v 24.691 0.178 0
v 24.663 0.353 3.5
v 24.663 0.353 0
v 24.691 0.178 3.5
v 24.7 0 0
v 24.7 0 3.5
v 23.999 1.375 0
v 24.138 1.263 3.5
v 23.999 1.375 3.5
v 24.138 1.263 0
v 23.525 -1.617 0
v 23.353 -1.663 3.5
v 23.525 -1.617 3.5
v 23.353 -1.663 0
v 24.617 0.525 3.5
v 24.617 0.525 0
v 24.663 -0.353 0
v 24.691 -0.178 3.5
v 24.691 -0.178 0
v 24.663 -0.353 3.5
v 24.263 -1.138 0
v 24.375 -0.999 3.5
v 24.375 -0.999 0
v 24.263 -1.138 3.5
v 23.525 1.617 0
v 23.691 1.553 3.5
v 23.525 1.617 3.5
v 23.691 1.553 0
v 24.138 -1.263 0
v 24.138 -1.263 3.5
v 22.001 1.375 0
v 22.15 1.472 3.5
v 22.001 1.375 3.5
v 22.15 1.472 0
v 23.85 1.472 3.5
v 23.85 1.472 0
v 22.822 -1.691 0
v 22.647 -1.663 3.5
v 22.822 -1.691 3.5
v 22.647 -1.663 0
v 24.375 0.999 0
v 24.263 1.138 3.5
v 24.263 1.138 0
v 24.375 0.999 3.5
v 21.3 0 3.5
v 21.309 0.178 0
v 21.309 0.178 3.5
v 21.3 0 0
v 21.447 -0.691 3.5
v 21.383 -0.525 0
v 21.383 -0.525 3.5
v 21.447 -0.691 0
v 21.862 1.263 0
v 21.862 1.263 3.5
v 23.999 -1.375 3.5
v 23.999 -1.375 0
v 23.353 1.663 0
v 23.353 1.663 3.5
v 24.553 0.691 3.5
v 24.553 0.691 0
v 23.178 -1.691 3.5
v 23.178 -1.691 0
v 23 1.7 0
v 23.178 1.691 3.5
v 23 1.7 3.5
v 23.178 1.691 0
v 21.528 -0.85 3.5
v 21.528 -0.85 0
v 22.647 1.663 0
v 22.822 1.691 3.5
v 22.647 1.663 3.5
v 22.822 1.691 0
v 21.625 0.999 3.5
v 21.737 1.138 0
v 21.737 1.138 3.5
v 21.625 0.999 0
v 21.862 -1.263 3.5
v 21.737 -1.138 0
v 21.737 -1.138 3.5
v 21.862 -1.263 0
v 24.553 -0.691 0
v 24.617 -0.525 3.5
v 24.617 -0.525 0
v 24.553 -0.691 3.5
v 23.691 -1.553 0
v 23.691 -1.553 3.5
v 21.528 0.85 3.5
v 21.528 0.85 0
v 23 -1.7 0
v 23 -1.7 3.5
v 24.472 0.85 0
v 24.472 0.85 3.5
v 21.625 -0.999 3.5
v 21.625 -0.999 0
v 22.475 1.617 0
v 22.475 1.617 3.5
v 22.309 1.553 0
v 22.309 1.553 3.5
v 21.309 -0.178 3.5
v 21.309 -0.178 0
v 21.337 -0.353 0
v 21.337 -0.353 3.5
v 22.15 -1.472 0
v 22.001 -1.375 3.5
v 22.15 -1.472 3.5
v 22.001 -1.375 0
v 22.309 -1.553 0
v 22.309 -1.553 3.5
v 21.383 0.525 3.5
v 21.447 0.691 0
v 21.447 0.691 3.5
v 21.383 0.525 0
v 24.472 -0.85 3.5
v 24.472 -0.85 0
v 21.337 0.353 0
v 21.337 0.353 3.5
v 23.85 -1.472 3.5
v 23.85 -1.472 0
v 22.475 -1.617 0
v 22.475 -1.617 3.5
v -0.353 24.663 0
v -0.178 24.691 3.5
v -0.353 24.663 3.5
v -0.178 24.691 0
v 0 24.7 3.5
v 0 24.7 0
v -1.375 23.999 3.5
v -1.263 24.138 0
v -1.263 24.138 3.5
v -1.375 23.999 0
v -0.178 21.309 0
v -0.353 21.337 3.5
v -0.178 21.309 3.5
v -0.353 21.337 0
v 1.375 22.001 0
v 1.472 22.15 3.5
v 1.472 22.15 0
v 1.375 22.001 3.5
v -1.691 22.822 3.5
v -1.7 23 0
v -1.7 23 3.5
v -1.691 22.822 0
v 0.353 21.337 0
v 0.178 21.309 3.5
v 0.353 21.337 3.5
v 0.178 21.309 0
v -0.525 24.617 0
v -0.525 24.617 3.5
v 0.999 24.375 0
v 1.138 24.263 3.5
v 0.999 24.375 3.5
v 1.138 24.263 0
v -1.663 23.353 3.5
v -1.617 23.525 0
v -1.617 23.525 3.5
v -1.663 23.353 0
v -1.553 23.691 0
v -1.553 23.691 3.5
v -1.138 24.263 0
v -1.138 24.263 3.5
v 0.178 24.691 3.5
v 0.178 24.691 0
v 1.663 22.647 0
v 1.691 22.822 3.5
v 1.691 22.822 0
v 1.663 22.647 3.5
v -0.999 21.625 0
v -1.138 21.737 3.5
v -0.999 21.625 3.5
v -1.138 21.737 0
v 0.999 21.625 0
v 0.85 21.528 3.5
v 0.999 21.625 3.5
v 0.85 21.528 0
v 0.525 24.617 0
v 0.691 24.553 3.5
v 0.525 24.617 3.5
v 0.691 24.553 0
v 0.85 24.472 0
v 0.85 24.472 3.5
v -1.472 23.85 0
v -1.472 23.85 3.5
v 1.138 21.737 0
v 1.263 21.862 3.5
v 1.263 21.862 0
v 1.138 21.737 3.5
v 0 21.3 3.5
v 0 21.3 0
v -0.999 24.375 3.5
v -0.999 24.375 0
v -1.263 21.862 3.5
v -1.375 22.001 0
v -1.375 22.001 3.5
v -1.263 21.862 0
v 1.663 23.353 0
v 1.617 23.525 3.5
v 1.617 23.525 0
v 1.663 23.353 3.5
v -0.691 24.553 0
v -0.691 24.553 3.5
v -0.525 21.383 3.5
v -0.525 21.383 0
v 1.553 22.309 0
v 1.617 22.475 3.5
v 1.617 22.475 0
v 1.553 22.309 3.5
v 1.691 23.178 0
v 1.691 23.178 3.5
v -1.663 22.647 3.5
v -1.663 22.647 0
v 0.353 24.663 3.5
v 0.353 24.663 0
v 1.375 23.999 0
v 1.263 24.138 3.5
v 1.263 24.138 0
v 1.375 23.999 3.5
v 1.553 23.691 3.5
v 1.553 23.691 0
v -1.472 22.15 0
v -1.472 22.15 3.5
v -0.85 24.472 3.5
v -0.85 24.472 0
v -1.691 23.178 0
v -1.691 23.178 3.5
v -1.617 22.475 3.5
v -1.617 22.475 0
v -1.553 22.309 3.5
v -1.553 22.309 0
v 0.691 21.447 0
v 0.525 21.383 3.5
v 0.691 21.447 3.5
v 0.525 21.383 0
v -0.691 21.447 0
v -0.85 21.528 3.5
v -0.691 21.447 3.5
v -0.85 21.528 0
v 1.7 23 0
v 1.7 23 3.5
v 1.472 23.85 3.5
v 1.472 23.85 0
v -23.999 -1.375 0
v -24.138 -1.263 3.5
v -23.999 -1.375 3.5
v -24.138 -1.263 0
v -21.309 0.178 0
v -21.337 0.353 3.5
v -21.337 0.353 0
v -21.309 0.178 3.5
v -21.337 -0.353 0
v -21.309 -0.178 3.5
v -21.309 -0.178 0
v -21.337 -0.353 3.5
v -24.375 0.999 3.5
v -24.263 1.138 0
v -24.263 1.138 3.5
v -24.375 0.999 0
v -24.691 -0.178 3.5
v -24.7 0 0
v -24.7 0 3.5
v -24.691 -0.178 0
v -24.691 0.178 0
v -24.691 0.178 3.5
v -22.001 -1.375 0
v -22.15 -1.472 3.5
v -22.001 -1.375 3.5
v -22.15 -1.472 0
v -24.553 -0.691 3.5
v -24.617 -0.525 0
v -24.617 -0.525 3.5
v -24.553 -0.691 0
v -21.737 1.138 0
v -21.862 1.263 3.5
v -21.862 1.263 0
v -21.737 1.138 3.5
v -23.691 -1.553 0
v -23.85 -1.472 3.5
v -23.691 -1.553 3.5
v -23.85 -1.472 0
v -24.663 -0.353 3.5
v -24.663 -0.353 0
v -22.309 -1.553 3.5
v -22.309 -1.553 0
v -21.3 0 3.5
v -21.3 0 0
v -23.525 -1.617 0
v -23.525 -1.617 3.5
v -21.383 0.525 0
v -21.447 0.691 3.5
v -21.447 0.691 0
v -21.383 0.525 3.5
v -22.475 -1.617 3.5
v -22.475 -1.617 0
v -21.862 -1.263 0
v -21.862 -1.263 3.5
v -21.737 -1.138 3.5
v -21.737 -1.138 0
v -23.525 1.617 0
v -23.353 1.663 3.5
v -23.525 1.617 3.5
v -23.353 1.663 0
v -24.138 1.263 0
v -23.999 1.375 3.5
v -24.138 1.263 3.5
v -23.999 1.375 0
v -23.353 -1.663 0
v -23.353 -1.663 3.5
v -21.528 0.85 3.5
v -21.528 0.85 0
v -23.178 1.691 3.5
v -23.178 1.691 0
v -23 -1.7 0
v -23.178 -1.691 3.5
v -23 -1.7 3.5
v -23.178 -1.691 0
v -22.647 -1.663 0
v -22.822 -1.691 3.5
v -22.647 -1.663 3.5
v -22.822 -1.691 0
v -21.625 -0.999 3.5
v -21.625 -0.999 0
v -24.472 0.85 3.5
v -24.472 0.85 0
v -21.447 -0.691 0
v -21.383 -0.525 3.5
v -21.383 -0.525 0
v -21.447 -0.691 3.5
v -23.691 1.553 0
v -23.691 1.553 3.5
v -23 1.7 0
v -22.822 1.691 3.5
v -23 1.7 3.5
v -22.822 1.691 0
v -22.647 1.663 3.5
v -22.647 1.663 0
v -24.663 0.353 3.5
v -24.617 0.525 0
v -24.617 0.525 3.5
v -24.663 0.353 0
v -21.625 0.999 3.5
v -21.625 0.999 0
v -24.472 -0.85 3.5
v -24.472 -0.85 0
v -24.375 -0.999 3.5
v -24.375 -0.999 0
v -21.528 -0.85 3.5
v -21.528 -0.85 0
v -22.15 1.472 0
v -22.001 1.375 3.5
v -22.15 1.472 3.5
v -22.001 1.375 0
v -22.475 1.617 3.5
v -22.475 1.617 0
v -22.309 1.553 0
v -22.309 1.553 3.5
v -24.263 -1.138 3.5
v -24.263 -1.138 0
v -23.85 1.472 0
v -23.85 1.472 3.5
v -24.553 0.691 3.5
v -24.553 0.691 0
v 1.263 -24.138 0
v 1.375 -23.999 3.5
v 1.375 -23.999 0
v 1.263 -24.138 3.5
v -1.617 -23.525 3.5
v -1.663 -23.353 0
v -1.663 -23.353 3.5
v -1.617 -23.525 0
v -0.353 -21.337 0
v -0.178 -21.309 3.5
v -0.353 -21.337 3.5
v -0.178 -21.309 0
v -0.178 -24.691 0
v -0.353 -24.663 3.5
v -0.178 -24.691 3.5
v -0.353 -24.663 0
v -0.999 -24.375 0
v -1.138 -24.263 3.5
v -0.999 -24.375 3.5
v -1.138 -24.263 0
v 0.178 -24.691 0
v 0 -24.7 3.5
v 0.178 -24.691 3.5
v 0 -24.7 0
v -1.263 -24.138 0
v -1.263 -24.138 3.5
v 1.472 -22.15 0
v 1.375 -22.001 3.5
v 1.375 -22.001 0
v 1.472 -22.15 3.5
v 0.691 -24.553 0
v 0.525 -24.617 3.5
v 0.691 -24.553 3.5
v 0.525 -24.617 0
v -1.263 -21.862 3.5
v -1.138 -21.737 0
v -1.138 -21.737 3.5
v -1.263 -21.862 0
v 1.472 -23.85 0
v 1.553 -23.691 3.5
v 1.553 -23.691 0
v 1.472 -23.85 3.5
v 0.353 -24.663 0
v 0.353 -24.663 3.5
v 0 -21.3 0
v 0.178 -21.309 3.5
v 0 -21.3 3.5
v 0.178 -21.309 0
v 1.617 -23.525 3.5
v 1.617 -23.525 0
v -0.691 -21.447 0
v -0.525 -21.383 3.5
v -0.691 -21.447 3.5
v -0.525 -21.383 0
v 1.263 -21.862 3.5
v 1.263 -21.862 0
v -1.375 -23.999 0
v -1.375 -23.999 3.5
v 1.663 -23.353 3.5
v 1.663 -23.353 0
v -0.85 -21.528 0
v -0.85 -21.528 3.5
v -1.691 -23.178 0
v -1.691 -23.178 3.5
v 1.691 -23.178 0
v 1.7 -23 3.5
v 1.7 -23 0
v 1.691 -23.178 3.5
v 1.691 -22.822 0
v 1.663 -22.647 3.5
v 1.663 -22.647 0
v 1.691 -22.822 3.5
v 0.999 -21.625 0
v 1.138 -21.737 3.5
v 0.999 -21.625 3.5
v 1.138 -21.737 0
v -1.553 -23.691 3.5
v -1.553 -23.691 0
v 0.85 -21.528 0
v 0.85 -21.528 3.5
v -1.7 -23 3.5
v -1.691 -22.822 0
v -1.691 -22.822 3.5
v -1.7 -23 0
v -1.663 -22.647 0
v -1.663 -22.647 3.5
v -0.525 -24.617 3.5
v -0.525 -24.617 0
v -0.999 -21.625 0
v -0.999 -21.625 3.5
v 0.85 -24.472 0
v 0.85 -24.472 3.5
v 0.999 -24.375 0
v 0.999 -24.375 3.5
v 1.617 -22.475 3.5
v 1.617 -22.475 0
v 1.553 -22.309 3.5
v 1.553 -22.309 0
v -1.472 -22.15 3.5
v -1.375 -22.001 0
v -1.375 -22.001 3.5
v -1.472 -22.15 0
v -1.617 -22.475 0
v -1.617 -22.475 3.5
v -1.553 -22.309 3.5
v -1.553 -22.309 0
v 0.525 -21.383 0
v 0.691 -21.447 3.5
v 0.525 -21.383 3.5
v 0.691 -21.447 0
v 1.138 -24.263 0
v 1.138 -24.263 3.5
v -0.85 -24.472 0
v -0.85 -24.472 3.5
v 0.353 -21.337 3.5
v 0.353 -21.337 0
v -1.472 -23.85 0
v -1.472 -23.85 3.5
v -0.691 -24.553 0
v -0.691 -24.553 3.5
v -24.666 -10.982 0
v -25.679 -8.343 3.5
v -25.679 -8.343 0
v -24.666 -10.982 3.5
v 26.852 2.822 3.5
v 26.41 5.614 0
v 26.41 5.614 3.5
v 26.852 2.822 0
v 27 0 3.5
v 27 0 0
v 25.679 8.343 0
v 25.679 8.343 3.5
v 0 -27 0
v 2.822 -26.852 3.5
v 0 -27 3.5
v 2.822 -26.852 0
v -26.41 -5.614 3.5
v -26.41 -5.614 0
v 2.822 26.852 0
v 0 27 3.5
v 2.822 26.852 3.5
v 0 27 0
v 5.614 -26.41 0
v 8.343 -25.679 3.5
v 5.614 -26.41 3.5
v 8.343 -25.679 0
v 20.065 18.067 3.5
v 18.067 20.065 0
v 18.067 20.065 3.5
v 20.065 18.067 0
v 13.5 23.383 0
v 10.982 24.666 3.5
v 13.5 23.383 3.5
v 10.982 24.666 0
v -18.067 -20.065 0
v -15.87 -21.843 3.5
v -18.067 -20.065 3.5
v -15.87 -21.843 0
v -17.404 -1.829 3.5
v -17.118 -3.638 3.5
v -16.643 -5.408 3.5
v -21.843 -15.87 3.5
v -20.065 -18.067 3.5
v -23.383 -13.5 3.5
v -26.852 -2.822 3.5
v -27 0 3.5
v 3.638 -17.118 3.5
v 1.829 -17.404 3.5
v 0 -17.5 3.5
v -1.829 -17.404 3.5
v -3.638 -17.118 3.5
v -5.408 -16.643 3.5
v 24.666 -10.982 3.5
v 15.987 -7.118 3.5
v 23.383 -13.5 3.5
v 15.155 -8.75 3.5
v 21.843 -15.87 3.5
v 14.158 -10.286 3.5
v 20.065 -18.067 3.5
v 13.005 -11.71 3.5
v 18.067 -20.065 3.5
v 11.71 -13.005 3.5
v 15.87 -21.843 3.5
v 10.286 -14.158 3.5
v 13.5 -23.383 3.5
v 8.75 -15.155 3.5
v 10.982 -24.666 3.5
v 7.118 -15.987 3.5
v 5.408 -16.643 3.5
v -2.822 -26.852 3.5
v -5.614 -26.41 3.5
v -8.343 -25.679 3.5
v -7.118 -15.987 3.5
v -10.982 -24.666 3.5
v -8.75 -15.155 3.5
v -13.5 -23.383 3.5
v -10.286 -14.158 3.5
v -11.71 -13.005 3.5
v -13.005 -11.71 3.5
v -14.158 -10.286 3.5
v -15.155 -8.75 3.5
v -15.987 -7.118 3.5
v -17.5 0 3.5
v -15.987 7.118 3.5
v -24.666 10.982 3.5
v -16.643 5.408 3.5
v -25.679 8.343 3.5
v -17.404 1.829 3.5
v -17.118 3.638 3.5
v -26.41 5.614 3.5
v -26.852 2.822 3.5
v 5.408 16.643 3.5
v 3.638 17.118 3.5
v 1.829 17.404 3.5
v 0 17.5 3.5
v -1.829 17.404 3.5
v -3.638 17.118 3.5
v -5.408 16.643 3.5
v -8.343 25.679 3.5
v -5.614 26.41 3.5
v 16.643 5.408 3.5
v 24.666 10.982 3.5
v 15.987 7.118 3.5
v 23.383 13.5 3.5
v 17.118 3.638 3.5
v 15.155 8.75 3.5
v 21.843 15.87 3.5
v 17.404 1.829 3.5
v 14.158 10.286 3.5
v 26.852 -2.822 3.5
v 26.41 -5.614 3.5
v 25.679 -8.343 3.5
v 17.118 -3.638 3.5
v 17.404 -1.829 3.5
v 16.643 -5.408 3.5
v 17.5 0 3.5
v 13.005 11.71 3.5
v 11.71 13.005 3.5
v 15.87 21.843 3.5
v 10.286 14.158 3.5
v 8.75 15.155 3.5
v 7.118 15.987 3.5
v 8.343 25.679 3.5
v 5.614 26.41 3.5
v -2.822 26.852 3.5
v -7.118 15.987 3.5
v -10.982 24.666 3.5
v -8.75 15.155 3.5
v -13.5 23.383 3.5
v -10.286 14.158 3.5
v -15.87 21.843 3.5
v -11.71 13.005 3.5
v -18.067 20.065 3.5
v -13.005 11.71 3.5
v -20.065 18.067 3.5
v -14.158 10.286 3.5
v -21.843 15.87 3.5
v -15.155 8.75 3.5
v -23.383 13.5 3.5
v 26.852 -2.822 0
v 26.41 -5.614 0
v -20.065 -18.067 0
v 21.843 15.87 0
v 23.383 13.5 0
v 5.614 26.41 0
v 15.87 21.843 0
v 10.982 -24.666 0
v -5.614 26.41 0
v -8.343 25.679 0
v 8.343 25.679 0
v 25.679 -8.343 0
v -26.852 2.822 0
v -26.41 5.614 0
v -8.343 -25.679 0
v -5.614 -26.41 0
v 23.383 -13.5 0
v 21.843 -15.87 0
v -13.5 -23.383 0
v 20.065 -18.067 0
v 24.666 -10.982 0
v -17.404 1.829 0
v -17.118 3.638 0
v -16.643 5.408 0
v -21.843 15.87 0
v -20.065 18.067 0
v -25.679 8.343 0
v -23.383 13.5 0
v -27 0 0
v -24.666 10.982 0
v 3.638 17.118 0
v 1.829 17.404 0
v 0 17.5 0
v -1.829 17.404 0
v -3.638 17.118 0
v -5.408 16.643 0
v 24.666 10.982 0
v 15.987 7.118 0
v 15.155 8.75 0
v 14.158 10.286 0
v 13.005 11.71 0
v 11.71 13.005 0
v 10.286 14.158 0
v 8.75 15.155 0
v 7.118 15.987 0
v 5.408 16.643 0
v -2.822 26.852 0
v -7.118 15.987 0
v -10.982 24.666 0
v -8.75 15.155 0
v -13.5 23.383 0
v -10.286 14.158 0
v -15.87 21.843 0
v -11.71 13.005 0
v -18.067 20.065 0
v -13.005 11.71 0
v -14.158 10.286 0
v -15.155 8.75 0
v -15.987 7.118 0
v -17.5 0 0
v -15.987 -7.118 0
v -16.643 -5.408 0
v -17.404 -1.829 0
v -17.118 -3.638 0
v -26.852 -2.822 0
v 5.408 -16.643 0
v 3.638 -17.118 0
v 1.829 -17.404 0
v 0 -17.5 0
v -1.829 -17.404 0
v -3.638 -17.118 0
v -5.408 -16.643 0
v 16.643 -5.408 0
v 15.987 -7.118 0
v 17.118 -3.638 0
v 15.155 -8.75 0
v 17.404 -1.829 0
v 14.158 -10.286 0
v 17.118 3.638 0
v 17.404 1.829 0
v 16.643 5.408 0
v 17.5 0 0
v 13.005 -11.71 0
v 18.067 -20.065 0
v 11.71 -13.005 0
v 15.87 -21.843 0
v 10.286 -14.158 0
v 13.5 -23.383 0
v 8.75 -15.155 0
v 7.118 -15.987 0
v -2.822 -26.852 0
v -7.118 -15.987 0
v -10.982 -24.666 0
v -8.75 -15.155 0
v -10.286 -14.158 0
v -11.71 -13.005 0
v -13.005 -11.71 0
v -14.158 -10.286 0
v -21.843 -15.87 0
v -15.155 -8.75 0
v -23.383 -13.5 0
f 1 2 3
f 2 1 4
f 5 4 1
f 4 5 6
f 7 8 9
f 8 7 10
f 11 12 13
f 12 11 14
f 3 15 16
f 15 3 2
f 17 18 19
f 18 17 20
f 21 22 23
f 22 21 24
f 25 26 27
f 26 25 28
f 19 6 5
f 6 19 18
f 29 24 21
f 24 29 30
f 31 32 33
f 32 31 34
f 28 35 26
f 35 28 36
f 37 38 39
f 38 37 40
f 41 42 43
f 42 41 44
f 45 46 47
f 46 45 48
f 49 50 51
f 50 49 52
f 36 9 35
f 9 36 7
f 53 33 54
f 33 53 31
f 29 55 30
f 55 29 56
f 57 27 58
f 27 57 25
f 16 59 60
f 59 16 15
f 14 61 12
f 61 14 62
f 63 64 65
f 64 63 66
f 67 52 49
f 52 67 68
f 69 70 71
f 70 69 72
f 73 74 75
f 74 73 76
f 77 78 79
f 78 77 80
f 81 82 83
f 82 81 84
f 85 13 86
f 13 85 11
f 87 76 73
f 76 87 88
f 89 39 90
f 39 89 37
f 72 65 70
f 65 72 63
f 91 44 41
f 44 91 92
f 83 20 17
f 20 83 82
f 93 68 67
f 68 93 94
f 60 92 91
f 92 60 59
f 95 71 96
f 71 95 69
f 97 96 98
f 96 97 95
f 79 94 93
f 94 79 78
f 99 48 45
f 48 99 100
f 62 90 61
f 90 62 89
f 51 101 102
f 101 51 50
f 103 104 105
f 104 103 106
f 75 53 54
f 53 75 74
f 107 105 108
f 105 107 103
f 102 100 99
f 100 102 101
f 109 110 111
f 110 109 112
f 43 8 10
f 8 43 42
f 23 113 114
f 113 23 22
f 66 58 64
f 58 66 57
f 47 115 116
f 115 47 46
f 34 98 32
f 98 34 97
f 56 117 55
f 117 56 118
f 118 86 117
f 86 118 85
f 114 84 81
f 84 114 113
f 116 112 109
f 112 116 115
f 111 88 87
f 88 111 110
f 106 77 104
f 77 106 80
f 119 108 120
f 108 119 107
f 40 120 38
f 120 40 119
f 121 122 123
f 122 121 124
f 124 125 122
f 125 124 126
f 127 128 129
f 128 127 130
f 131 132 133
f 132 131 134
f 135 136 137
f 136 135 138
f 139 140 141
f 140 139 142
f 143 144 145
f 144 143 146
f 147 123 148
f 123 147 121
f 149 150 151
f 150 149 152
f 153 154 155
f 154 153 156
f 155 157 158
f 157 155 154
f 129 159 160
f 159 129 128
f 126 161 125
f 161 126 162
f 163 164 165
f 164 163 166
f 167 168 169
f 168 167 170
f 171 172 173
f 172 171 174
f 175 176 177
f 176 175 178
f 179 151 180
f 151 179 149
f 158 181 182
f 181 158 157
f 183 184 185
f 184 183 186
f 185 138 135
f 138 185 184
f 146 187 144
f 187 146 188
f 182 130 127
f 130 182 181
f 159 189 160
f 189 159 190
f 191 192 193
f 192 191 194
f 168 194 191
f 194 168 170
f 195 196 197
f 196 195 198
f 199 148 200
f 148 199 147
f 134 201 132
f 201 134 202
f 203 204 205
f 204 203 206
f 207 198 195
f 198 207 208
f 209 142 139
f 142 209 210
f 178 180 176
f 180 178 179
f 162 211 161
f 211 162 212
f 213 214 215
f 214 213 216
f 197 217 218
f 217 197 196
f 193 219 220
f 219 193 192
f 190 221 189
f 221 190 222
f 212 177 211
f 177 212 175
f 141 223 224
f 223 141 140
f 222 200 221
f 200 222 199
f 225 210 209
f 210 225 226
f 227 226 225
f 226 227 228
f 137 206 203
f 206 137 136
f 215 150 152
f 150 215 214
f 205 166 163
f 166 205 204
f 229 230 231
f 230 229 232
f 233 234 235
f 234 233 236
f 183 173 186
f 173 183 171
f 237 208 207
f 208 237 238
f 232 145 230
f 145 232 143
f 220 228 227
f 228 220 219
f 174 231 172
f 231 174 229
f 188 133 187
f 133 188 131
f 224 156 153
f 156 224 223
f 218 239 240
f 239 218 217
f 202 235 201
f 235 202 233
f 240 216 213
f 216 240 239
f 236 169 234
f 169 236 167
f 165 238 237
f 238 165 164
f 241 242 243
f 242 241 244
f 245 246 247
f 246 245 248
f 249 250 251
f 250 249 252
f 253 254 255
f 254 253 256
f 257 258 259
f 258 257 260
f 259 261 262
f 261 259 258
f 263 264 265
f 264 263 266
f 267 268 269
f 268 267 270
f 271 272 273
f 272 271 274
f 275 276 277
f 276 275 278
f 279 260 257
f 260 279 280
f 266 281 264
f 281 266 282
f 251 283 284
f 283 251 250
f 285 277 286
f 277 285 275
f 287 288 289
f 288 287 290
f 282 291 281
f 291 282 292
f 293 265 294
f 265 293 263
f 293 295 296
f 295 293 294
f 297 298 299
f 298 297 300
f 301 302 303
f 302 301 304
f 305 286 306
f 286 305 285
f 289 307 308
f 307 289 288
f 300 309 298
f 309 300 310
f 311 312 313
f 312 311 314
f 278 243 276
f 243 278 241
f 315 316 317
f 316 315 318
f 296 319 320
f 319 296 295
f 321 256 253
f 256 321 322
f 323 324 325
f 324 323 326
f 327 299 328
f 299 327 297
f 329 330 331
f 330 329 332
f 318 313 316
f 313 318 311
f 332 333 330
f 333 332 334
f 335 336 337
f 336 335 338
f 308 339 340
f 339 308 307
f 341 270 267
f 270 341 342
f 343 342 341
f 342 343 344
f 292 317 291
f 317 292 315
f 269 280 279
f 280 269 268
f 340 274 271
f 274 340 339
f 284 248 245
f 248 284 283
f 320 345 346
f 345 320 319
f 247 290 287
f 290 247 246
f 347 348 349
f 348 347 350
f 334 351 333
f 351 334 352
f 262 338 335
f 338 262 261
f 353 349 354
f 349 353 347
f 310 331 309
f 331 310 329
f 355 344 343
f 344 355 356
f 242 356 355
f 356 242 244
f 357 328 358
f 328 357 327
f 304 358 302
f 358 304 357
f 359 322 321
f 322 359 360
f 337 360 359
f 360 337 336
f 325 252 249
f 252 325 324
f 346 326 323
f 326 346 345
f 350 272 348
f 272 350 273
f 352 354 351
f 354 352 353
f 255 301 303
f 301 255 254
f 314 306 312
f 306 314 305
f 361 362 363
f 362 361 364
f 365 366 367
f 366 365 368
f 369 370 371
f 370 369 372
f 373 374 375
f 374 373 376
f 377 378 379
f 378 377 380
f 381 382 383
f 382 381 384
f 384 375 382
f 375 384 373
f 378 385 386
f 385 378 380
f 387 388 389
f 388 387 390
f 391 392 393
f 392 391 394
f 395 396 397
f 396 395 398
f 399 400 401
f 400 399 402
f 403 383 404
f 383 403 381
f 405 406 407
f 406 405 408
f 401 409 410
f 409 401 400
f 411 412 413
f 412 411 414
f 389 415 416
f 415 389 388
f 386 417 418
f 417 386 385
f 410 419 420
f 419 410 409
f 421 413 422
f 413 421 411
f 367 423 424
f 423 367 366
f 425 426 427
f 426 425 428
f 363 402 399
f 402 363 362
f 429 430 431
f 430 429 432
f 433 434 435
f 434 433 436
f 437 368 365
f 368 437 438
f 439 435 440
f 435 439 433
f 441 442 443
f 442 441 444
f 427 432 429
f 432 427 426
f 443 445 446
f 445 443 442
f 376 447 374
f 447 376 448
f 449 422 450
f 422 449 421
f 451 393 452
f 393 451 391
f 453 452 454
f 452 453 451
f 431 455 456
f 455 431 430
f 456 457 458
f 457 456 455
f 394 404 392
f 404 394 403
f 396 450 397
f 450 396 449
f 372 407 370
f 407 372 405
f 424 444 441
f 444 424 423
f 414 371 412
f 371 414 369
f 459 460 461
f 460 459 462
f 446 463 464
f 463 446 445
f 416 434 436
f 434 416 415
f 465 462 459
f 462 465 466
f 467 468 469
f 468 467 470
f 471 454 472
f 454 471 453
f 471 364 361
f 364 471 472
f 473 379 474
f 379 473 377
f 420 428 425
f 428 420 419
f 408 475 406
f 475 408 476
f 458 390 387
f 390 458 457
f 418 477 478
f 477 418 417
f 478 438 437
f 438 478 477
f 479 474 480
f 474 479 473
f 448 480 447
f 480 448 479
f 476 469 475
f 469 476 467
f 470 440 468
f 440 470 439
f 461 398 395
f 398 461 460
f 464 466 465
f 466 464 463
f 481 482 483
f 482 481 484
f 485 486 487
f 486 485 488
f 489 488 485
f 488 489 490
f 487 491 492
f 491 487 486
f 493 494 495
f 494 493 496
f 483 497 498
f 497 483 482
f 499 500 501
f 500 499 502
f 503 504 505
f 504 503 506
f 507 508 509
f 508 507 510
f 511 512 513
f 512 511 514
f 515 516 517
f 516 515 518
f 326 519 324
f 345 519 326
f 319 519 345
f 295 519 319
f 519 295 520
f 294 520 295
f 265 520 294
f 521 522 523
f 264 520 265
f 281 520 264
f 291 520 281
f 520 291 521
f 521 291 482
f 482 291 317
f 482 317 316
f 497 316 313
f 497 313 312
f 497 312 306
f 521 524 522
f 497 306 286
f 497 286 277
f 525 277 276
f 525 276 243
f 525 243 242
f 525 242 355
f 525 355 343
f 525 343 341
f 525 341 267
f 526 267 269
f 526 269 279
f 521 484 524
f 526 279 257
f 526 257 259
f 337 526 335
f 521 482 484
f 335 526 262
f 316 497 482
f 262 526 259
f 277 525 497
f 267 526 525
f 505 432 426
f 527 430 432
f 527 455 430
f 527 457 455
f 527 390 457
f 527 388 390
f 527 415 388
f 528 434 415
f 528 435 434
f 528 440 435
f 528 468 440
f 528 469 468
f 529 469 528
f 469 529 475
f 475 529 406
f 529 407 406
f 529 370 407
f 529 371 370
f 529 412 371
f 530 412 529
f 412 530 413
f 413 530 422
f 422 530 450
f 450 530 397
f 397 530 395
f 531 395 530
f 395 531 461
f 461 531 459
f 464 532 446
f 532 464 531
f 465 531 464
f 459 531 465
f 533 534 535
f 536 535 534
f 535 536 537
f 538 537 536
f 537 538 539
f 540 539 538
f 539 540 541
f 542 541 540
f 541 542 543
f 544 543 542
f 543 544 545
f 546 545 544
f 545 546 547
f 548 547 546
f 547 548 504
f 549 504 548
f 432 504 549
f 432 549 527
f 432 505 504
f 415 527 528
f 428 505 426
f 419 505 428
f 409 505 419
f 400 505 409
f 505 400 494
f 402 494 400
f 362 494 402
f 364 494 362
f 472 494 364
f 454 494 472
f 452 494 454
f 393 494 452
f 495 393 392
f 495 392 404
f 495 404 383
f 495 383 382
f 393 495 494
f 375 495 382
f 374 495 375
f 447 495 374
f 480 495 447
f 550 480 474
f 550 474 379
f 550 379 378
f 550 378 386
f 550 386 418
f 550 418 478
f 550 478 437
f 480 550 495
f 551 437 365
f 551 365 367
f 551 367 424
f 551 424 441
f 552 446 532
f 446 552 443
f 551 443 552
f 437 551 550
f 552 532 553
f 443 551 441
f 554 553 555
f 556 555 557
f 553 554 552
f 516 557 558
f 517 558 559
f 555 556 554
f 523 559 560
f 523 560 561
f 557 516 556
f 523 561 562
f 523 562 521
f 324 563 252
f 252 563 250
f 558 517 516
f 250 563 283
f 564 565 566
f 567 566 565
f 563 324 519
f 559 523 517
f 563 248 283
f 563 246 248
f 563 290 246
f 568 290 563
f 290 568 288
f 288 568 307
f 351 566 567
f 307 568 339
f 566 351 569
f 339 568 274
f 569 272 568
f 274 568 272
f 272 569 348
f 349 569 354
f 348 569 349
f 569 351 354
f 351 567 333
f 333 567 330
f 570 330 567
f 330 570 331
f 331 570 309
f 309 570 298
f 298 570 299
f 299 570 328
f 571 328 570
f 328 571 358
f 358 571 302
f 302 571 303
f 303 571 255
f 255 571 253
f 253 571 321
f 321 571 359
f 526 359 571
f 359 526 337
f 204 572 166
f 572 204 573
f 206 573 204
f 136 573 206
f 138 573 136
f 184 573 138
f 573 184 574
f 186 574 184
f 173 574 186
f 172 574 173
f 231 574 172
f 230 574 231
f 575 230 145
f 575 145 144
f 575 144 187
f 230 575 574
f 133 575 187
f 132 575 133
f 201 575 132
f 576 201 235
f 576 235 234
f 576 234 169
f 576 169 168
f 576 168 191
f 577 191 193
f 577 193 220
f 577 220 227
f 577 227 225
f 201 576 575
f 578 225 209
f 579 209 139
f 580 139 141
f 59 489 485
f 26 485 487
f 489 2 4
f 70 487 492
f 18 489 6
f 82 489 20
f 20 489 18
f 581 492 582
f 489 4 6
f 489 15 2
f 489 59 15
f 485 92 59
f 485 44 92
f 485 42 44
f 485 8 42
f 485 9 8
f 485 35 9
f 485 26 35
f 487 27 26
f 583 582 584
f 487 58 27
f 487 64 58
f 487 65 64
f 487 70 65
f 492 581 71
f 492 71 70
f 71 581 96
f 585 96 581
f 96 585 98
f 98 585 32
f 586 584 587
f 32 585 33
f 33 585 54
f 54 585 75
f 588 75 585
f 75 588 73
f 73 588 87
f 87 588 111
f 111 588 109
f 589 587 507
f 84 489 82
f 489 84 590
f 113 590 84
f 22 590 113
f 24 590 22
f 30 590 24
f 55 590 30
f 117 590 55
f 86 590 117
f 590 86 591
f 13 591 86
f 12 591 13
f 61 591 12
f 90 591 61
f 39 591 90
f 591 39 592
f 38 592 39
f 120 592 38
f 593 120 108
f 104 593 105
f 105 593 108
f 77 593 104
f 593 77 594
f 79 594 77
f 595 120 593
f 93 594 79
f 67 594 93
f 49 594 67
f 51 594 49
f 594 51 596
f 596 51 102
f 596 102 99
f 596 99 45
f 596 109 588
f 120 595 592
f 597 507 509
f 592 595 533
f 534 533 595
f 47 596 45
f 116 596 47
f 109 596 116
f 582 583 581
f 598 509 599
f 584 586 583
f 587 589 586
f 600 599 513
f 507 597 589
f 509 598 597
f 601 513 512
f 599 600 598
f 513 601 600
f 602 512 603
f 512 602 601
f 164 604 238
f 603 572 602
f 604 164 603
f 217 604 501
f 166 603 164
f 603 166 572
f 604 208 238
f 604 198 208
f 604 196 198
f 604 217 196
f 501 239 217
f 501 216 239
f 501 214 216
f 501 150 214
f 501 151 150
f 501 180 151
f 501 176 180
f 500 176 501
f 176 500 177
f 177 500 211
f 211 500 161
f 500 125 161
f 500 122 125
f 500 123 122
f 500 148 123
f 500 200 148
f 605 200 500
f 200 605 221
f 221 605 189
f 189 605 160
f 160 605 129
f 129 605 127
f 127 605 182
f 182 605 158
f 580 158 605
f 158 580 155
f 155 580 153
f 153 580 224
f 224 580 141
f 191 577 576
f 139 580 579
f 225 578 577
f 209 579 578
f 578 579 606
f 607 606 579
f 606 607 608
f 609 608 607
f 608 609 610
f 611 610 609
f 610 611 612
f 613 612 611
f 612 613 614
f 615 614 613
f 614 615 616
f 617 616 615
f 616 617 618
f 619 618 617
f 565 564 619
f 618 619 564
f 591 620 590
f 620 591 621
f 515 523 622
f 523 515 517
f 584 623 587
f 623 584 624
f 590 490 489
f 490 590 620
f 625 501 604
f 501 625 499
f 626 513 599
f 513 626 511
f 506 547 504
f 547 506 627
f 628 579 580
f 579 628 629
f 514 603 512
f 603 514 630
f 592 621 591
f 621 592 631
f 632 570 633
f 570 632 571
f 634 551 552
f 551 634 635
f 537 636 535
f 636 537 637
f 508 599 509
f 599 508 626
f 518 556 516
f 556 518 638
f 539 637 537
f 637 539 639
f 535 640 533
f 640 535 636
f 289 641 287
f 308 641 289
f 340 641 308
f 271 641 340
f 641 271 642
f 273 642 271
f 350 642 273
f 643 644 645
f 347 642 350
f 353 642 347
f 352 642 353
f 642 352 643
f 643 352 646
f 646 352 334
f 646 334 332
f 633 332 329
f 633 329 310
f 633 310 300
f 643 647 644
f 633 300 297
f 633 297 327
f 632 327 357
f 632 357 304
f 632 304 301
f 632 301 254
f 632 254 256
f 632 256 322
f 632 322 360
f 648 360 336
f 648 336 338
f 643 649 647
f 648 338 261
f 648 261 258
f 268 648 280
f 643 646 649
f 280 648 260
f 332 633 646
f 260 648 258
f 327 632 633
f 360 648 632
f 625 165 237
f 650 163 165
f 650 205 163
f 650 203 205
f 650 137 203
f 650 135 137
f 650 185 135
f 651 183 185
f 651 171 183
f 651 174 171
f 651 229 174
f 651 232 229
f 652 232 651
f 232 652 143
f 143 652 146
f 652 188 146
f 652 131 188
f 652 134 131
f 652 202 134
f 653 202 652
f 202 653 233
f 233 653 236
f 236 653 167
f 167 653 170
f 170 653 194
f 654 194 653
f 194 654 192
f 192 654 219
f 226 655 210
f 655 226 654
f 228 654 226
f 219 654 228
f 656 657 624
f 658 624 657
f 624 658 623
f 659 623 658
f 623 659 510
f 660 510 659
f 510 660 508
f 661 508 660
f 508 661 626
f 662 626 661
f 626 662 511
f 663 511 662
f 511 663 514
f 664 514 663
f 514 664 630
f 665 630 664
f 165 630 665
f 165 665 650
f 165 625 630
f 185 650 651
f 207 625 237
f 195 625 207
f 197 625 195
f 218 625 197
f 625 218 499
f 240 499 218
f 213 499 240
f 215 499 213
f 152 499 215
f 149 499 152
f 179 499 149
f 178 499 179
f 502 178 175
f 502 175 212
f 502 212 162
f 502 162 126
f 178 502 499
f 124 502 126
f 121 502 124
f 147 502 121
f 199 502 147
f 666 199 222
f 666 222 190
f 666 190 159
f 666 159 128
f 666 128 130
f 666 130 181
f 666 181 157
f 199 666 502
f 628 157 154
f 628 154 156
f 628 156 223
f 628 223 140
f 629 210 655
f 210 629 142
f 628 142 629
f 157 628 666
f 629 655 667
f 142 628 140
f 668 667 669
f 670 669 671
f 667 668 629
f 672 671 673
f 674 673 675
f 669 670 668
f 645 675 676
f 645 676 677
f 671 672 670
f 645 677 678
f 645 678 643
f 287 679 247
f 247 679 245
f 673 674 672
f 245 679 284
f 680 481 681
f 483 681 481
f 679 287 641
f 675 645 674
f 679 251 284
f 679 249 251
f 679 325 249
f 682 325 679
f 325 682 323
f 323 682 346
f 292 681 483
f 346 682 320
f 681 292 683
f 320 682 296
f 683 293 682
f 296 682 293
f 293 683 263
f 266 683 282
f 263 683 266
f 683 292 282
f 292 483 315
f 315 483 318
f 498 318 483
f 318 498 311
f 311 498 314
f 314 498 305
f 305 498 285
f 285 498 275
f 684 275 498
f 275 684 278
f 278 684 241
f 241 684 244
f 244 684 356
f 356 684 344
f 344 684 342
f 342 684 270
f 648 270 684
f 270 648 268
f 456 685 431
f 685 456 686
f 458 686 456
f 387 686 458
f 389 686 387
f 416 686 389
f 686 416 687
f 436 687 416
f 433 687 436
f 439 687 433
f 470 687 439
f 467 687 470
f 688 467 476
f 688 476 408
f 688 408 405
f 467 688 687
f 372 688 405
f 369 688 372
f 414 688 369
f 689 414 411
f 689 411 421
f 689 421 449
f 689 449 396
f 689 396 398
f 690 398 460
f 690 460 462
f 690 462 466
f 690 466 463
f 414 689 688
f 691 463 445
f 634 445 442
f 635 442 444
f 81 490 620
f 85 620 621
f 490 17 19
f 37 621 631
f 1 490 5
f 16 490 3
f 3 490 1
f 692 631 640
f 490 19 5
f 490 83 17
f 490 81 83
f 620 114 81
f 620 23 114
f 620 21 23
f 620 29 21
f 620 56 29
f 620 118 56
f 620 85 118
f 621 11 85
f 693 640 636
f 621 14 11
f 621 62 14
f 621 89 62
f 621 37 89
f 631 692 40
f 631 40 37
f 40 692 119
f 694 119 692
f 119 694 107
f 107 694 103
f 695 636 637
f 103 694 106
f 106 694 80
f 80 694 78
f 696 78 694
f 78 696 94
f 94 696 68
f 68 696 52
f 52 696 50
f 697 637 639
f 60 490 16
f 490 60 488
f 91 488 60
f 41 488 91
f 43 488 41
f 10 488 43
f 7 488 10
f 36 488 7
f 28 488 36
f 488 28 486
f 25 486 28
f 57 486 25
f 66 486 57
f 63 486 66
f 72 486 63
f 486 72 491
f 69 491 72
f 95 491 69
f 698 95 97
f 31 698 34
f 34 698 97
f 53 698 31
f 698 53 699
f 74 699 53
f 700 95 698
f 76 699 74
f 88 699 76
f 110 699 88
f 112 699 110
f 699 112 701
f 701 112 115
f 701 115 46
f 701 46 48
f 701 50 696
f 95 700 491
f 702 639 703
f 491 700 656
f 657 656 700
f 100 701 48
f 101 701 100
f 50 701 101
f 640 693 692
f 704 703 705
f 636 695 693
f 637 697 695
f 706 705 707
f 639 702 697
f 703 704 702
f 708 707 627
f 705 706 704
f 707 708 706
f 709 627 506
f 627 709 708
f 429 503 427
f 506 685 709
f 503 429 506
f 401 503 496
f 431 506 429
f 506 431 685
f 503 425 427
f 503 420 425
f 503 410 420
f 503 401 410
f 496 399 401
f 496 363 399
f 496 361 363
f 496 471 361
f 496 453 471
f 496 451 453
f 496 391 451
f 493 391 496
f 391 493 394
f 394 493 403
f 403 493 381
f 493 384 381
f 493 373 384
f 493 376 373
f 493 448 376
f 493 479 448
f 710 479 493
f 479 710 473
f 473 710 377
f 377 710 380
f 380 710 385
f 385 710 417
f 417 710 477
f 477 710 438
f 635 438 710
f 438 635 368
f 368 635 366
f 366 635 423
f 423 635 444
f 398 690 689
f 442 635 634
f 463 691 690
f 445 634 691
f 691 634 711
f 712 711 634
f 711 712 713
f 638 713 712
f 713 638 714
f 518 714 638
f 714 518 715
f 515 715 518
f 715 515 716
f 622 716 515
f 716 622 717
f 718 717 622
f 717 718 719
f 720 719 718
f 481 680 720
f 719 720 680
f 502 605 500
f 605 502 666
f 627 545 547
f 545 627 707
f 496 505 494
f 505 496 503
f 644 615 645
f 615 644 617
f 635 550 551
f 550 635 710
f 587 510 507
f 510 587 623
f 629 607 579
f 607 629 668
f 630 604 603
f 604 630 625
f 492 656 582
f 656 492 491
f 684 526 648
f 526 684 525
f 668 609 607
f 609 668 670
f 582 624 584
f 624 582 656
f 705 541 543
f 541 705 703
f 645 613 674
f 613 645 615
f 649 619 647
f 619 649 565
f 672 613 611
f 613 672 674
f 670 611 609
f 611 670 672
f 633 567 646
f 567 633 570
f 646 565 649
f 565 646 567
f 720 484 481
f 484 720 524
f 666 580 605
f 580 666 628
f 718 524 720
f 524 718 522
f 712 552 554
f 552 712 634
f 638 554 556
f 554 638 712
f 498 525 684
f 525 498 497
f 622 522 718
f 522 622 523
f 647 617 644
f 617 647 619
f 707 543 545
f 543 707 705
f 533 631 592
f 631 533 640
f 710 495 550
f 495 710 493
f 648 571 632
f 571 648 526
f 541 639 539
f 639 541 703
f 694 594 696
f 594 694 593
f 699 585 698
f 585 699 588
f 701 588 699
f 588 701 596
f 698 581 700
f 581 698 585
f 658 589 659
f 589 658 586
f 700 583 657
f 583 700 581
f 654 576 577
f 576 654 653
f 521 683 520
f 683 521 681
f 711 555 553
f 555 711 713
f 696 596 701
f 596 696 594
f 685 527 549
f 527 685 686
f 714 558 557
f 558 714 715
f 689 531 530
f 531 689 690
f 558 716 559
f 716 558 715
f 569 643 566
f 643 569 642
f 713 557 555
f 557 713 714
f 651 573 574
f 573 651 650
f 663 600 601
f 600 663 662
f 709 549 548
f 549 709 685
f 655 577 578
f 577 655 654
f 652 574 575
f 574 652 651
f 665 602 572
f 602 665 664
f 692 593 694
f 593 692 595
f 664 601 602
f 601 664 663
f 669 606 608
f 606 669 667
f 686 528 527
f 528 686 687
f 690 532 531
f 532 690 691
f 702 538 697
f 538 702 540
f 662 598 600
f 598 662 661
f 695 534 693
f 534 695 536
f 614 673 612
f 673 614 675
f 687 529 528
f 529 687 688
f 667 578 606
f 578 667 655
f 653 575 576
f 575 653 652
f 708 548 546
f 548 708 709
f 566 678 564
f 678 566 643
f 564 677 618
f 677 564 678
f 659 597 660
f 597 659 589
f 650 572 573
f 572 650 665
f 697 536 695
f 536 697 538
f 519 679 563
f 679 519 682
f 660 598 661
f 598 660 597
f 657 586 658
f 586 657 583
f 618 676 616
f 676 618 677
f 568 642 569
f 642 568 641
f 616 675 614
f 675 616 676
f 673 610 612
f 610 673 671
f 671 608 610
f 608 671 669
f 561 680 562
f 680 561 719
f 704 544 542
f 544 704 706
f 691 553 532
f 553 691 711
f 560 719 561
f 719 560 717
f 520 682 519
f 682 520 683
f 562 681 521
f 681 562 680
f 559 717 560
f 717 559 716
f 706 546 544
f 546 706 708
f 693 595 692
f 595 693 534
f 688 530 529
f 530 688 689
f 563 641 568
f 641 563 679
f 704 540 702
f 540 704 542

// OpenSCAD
// Bearing retaining ring.
$fn = 60;
eps = 0.02;
bearing_d = 35;
outer_d = 54;
thickness = 3.5;
difference() {
    cylinder(d=outer_d,h=thickness);
    translate([0,0,-eps]) cylinder(d=bearing_d,h=thickness+2*eps);
    for (i=[0:3]) rotate([0,0,i*90]) translate([outer_d/2-4,0,-eps]) cylinder(d=3.4,h=thickness+2*eps);
}
